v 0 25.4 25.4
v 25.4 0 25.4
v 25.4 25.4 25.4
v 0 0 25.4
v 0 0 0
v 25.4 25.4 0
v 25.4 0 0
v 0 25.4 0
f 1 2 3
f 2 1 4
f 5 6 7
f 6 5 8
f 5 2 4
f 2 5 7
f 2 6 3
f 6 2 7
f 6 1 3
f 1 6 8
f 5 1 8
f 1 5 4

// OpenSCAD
// Unit of length: Unit.MM
cube(size = 25.4, center = false);
